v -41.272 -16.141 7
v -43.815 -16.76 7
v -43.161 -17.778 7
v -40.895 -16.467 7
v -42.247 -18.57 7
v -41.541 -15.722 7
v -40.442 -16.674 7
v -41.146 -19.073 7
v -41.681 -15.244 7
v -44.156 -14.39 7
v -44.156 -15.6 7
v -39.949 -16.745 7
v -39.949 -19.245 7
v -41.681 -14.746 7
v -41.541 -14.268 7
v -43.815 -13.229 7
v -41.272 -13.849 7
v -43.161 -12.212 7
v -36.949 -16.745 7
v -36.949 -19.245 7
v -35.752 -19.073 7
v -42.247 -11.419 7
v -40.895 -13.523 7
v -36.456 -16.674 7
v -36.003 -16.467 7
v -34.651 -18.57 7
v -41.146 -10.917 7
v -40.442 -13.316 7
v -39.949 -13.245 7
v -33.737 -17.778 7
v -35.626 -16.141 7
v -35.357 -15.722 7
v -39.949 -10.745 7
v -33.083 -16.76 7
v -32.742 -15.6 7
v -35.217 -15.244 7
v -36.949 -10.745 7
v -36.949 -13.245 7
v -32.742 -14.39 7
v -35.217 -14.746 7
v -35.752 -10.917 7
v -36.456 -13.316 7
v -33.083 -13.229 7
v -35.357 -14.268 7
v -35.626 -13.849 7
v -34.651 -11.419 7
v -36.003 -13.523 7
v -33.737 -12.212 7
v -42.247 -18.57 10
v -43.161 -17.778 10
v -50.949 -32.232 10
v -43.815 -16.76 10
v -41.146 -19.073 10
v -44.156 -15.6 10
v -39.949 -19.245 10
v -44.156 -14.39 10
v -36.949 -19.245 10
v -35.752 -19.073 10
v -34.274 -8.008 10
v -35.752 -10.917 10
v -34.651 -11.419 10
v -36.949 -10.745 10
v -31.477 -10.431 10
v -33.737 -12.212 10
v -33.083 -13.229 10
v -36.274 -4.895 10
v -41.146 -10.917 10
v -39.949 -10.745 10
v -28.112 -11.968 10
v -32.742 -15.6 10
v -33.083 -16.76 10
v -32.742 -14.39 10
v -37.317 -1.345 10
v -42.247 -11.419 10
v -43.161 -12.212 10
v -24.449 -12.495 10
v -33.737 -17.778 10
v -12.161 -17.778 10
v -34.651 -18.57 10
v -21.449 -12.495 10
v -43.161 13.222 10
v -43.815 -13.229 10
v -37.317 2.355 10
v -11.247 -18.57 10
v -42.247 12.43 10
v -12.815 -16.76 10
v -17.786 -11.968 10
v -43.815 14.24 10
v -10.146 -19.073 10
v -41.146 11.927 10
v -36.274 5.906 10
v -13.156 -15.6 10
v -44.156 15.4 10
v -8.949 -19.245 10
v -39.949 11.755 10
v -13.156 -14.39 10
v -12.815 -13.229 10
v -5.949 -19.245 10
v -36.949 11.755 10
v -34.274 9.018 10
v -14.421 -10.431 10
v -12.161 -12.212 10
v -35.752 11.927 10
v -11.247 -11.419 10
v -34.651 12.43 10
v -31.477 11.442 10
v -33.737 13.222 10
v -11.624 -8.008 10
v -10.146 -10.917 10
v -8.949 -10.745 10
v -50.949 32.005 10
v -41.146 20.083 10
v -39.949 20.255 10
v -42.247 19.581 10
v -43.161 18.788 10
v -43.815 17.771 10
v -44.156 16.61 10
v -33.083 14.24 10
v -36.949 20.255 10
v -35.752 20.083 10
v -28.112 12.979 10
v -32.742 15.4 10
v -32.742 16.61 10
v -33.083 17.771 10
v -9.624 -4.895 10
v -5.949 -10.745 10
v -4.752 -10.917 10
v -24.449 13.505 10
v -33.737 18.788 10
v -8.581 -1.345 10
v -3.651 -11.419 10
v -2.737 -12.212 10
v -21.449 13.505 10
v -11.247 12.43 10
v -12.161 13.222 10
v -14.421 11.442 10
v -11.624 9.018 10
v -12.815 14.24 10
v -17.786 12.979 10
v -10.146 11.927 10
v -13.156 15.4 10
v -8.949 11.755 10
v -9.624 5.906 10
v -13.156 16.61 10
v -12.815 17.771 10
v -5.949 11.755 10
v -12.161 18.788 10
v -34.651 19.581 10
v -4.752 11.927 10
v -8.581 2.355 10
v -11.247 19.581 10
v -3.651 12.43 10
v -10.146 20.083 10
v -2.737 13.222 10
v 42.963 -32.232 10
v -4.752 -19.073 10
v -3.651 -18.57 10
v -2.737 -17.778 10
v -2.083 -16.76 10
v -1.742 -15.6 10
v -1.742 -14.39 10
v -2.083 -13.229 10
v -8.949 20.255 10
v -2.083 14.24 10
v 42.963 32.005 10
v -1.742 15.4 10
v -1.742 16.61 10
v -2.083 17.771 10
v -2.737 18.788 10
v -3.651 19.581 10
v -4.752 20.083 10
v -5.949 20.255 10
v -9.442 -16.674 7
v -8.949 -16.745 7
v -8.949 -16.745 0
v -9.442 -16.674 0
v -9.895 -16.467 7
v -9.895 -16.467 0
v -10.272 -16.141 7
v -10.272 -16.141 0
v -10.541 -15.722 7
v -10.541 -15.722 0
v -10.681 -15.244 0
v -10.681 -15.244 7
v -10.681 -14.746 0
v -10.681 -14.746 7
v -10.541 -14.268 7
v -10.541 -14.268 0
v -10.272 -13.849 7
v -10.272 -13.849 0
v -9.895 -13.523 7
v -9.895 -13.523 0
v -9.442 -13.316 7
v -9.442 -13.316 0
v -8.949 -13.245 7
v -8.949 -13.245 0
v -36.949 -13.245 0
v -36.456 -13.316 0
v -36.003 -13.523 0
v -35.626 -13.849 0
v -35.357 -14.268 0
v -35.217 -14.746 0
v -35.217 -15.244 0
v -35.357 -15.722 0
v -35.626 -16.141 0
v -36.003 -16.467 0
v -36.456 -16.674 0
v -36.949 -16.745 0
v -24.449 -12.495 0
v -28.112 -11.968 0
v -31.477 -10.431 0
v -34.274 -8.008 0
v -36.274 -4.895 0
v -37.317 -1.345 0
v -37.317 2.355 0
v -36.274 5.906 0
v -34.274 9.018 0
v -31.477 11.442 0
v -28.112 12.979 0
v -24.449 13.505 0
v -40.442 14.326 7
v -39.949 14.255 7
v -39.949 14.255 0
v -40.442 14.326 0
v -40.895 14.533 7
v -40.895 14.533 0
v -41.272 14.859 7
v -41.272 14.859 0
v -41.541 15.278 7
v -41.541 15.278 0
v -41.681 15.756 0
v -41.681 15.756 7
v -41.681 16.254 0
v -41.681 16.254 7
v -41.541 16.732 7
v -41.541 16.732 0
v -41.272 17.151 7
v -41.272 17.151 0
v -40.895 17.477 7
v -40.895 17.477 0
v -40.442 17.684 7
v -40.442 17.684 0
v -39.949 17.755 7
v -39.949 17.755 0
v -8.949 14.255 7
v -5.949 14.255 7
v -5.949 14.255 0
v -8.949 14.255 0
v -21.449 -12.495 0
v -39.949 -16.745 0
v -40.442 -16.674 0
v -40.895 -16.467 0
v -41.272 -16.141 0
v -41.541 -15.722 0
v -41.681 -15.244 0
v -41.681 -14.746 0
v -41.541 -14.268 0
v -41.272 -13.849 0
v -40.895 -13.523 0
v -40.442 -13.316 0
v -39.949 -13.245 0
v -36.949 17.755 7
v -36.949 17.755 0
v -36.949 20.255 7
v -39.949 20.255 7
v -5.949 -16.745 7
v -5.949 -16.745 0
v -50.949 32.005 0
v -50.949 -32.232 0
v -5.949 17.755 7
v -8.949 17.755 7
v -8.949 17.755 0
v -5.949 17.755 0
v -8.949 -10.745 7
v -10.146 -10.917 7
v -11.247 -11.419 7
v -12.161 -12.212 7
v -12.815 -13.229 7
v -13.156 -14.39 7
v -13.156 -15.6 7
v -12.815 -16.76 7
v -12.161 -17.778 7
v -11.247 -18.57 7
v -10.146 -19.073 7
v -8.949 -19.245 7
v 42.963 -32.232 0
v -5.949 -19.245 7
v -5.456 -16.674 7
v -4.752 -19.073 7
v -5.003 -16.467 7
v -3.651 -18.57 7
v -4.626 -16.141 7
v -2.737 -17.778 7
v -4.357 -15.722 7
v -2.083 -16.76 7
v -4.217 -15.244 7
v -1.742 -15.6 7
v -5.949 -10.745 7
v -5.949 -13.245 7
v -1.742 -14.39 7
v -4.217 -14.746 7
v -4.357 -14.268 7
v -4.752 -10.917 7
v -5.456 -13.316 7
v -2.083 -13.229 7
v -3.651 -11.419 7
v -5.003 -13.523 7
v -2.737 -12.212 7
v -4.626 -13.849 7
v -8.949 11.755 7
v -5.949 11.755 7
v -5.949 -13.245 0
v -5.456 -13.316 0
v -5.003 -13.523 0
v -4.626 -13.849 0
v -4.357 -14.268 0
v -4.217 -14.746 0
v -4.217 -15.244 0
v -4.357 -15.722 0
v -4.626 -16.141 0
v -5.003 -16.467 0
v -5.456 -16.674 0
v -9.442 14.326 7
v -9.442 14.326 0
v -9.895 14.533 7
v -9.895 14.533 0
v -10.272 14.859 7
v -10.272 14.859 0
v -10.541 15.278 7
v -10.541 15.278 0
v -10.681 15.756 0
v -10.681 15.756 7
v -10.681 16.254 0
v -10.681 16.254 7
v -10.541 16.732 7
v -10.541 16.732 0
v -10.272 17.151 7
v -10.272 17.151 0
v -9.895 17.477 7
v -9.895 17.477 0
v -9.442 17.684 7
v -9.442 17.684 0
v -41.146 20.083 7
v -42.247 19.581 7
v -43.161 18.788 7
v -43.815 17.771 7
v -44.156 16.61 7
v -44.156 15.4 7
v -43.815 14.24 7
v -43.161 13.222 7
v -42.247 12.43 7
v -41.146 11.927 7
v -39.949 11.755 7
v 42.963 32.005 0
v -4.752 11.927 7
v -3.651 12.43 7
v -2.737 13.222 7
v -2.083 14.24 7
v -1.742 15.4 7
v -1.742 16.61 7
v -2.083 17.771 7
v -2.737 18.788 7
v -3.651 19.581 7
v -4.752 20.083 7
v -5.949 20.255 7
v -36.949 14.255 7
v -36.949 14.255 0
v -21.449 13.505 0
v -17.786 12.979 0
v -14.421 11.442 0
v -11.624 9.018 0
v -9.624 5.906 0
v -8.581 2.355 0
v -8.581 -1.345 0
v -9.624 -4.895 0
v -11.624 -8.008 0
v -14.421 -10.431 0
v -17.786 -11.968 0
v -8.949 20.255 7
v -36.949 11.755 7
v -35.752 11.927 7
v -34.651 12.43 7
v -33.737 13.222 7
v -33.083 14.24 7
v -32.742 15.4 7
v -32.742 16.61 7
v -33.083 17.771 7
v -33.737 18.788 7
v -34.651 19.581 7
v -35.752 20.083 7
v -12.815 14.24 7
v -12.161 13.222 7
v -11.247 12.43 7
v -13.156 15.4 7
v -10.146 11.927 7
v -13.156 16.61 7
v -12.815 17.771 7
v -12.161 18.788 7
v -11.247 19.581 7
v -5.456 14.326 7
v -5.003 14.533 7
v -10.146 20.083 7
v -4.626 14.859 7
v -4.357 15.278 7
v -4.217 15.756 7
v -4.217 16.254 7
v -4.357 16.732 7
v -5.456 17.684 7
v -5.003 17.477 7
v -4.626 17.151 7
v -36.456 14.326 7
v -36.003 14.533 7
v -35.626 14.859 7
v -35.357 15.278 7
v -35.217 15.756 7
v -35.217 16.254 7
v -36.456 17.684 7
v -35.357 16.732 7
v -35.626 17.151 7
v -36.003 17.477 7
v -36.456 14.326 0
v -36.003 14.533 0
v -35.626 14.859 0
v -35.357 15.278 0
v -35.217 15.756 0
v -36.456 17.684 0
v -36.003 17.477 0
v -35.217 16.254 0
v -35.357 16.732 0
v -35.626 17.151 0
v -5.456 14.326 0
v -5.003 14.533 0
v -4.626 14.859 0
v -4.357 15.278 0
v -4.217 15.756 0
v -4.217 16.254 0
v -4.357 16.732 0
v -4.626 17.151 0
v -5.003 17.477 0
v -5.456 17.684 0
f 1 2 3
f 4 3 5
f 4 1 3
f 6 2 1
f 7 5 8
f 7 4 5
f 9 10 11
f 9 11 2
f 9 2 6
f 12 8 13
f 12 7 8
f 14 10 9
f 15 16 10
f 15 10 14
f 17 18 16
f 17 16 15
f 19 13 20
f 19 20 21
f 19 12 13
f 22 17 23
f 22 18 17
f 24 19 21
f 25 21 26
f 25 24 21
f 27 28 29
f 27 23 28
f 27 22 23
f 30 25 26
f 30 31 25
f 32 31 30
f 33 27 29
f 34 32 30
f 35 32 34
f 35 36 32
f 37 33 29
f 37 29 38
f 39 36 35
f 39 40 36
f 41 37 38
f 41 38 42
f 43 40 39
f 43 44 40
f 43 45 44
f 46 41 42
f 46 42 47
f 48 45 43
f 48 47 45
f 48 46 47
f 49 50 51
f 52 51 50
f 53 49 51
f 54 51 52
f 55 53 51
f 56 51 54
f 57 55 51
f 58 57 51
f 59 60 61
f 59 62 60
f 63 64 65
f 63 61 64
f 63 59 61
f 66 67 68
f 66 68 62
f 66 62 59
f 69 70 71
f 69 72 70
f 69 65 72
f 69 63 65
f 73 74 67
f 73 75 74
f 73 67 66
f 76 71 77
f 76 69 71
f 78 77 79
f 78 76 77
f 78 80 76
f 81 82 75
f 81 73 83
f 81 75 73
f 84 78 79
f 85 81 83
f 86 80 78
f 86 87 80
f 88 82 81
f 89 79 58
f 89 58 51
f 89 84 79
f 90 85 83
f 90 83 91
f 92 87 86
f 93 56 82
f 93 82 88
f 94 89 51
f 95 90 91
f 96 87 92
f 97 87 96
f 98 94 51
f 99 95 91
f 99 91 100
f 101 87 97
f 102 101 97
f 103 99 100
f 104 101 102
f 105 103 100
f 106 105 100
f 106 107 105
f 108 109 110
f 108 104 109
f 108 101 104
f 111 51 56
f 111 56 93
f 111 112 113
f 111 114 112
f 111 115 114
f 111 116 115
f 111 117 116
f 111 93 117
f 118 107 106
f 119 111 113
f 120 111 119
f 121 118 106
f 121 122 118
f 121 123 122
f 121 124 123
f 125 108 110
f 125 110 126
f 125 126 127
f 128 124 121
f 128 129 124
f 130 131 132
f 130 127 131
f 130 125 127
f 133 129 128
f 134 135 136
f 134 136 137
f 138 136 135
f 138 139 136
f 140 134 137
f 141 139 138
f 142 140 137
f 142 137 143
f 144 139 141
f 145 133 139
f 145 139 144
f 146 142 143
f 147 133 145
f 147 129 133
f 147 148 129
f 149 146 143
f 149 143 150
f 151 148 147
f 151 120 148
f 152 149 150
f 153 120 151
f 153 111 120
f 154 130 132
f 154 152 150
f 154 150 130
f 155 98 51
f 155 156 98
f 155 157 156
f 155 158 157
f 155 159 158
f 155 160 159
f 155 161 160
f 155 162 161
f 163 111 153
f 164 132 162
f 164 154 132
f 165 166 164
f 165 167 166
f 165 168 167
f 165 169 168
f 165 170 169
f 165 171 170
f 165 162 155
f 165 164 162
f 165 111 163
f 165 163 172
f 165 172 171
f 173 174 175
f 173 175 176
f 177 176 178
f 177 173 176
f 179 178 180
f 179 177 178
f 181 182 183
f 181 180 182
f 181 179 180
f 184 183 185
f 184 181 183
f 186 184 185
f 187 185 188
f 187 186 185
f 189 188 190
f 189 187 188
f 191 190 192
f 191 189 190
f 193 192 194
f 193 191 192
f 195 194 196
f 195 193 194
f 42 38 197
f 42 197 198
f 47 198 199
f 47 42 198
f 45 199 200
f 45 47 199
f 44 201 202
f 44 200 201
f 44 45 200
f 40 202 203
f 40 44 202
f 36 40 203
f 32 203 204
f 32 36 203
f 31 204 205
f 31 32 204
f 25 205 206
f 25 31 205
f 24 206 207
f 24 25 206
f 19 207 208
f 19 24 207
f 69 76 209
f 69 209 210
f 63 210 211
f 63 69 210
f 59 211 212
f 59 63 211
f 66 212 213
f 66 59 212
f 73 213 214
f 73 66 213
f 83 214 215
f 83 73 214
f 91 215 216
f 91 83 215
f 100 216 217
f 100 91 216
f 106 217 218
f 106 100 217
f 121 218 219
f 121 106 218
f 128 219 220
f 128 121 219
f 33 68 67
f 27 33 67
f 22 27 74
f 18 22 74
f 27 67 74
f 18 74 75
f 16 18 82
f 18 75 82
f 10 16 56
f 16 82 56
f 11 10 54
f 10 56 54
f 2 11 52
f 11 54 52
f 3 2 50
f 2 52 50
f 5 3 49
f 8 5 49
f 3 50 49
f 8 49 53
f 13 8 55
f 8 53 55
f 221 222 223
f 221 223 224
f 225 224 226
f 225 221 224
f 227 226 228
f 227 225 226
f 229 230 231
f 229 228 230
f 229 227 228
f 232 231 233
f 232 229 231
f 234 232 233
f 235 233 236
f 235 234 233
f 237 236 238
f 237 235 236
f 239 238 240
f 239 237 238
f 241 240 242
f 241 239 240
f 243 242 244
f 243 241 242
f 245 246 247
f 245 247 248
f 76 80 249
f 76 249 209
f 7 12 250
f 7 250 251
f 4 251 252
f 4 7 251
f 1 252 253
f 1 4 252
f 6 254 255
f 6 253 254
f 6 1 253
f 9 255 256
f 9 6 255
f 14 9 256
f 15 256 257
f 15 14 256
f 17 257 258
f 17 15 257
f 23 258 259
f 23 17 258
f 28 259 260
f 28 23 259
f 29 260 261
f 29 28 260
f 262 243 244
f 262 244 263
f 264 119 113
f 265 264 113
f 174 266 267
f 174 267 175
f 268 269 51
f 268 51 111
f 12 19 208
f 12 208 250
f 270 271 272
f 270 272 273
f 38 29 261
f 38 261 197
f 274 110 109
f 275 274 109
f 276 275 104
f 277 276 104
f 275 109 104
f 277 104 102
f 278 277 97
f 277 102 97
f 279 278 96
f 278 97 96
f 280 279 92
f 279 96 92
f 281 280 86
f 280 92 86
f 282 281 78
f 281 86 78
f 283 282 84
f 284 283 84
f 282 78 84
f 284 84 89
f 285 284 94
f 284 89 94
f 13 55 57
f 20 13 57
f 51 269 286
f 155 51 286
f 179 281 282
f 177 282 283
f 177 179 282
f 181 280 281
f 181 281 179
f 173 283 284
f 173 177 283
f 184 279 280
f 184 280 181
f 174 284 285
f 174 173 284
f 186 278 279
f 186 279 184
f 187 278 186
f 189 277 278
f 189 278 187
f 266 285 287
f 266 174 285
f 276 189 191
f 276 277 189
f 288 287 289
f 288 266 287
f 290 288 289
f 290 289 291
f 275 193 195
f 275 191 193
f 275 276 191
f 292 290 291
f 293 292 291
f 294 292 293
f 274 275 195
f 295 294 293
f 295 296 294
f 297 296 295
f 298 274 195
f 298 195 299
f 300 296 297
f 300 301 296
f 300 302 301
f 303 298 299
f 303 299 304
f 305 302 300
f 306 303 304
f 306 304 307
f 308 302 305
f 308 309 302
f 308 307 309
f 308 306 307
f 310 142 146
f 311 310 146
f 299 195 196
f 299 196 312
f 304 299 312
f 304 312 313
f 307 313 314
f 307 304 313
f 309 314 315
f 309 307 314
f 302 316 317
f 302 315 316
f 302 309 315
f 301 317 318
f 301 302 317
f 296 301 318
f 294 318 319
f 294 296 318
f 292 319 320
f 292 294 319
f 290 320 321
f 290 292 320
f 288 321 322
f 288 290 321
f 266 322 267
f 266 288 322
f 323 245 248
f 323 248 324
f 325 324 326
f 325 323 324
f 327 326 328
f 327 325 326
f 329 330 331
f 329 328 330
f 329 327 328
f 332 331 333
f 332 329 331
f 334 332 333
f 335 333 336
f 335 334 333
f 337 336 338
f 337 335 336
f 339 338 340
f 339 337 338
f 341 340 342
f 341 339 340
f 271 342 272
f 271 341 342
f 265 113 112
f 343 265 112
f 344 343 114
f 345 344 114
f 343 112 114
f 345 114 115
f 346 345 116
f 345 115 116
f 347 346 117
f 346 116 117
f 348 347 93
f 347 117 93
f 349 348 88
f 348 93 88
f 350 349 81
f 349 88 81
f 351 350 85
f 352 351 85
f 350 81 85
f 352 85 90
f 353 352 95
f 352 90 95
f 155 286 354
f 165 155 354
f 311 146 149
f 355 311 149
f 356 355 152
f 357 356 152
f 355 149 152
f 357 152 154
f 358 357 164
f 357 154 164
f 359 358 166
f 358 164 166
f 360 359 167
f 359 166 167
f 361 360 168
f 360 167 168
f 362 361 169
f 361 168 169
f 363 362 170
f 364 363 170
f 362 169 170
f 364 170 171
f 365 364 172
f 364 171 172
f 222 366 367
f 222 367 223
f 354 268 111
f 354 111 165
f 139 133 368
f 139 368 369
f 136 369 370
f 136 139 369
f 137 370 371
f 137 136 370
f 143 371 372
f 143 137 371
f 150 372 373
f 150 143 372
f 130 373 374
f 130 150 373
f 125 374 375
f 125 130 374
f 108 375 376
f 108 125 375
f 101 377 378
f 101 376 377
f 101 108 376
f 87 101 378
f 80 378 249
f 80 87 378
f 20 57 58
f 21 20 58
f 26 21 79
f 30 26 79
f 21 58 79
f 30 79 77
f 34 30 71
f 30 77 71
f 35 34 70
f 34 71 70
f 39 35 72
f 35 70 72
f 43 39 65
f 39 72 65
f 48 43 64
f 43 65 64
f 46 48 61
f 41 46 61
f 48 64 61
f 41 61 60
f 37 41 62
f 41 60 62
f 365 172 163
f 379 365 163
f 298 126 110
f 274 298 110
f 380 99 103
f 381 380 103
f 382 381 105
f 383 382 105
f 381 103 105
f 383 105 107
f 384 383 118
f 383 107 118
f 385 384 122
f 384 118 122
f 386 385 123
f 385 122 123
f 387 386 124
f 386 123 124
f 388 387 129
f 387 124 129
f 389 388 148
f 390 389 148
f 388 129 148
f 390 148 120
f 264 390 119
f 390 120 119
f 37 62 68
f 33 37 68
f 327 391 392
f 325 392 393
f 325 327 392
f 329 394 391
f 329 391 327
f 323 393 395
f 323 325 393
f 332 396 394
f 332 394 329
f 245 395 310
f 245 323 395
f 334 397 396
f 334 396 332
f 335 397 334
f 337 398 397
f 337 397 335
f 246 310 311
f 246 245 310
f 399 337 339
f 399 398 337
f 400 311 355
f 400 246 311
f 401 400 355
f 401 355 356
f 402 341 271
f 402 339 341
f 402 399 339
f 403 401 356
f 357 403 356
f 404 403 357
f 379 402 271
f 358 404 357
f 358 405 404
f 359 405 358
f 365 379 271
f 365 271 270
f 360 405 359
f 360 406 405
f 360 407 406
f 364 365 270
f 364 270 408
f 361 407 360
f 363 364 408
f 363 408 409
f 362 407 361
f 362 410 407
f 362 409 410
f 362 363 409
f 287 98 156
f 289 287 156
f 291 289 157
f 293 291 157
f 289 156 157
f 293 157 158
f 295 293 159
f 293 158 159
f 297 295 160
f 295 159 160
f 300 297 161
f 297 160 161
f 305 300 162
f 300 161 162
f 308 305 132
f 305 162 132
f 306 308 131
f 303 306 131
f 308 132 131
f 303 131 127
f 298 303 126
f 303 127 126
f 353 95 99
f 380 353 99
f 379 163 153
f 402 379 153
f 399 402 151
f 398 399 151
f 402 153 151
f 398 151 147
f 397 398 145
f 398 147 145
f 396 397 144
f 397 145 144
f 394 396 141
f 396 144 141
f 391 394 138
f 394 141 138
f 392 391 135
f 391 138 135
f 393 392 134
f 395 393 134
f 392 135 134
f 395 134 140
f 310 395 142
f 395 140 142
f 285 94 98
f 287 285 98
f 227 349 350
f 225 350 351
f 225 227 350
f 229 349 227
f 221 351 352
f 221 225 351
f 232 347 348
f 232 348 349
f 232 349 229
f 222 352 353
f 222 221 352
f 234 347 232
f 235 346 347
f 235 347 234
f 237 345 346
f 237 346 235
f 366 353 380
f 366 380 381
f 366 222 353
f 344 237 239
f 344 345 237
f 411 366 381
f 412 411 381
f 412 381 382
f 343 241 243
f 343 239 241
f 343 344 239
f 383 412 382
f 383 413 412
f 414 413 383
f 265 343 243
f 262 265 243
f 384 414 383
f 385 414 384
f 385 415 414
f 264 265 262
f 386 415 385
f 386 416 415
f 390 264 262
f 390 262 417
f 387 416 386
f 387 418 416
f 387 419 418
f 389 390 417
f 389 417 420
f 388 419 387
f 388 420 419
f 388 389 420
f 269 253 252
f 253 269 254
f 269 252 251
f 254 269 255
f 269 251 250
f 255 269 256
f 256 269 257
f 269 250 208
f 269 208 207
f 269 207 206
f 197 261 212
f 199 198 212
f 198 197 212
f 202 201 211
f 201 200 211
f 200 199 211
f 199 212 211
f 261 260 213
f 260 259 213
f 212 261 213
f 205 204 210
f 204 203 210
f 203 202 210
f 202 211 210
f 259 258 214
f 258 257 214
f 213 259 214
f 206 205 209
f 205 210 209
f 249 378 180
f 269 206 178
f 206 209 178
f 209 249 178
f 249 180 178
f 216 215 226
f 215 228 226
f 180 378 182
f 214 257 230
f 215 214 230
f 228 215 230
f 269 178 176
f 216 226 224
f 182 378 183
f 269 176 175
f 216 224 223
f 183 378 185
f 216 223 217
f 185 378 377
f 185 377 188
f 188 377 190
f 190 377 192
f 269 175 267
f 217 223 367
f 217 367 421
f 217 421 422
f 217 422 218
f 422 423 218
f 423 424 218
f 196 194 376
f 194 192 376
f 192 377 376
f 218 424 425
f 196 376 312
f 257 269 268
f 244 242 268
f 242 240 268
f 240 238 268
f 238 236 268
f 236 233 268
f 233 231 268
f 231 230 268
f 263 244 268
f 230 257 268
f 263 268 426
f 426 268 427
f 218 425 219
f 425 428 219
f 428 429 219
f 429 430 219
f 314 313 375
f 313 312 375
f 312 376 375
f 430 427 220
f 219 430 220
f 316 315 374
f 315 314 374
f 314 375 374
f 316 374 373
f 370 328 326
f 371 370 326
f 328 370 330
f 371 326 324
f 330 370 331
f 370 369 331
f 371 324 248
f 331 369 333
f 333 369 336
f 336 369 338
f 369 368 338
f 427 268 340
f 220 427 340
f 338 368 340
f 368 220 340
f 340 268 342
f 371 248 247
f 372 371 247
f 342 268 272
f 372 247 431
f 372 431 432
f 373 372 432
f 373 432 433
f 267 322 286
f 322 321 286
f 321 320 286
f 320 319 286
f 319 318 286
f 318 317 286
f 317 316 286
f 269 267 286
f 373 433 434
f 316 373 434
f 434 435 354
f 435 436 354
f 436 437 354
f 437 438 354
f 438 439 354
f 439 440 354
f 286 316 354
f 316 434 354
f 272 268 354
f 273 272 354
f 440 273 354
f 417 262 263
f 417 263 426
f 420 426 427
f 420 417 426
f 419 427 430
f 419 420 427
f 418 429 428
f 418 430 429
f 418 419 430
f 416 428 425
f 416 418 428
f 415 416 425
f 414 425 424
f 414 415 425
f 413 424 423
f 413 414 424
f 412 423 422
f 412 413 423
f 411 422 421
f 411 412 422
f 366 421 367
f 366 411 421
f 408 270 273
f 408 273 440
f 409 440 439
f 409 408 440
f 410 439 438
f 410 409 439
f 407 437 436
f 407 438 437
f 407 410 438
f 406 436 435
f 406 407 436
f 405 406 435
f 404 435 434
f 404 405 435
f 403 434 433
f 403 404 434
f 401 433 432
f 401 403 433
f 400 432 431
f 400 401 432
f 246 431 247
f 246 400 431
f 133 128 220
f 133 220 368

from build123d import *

# Parameters (mm, degrees)
SKETCH1_W           = 93.911938319
SKETCH1_H           = 64.237222829
BOSS_EXTRUDE1_DEPTH = 10
CUT_EXTRUDE1_DEPTH  = 20
CUT_EXTRUDE2_DEPTH  = 3


with BuildPart() as part:
    # Sketch1 → Boss-Extrude1 (new body)
    with BuildSketch(Plane.XY):
        with Locations((-3.99305407, -0.113373268)):
            Rectangle(SKETCH1_W, SKETCH1_H)
    extrude(amount=BOSS_EXTRUDE1_DEPTH)

    # Sketch2 → Cut-Extrude1 (cut)
    with BuildSketch(Plane.XY.offset(10)):
        with BuildLine():
            Line((-39.949023229, 17.755238146), (-36.949023229, 17.755238146))
            ThreePointArc((-36.949023229, 17.755238146), (-35.199023229, 16.005238146), (-36.949023229, 14.255238146))
            Line((-36.949023229, 14.255238146), (-39.949023229, 14.255238146))
            ThreePointArc((-39.949023229, 14.255238146), (-41.699023229, 16.005238146), (-39.949023229, 17.755238146))
        make_face()
        with BuildLine():
            Line((-8.949023229, 17.755238146), (-5.949023229, 17.755238146))
            ThreePointArc((-5.949023229, 17.755238146), (-4.199023229, 16.005238146), (-5.949023229, 14.255238146))
            Line((-5.949023229, 14.255238146), (-8.949023229, 14.255238146))
            ThreePointArc((-8.949023229, 14.255238146), (-10.699023229, 16.005238146), (-8.949023229, 17.755238146))
        make_face()
        with BuildLine():
            Line((-8.949023229, -13.244761854), (-5.949023229, -13.244761854))
            ThreePointArc((-5.949023229, -13.244761854), (-4.199023229, -14.994761854), (-5.949023229, -16.744761854))
            Line((-5.949023229, -16.744761854), (-8.949023229, -16.744761854))
            ThreePointArc((-8.949023229, -16.744761854), (-10.699023229, -14.994761854), (-8.949023229, -13.244761854))
        make_face()
        with BuildLine():
            Line((-39.949023229, -13.244761854), (-36.949023229, -13.244761854))
            ThreePointArc((-36.949023229, -13.244761854), (-35.199023229, -14.994761854), (-36.949023229, -16.744761854))
            Line((-36.949023229, -16.744761854), (-39.949023229, -16.744761854))
            ThreePointArc((-39.949023229, -16.744761854), (-41.699023229, -14.994761854), (-39.949023229, -13.244761854))
        make_face()
        with BuildLine():
            Line((-24.449023229, 13.505238146), (-21.449023229, 13.505238146))
            ThreePointArc((-21.449023229, 13.505238146), (-8.449023229, 0.505238146), (-21.449023229, -12.494761854))
            Line((-21.449023229, -12.494761854), (-24.449023229, -12.494761854))
            ThreePointArc((-24.449023229, -12.494761854), (-37.449023229, 0.505238146), (-24.449023229, 13.505238146))
        make_face()
    extrude(amount=-CUT_EXTRUDE1_DEPTH, mode=Mode.SUBTRACT)

    # Sketch3 → Cut-Extrude2 (cut)
    with BuildSketch(Plane.XY.offset(10)):
        with BuildLine():
            Line((-36.949023229, 20.255238146), (-39.949023229, 20.255238146))
            ThreePointArc((-39.949023229, 20.255238146), (-44.199023229, 16.005238146), (-39.949023229, 11.755238146))
            Line((-39.949023229, 11.755238146), (-36.949023229, 11.755238146))
            ThreePointArc((-36.949023229, 11.755238146), (-32.699023229, 16.005238146), (-36.949023229, 20.255238146))
        make_face()
        with BuildLine():
            Line((-5.949023229, 20.255238146), (-8.949023229, 20.255238146))
            ThreePointArc((-8.949023229, 20.255238146), (-13.199023229, 16.005238146), (-8.949023229, 11.755238146))
            Line((-8.949023229, 11.755238146), (-5.949023229, 11.755238146))
            ThreePointArc((-5.949023229, 11.755238146), (-1.699023229, 16.005238146), (-5.949023229, 20.255238146))
        make_face()
        with BuildLine():
            Line((-5.949023229, -10.744761854), (-8.949023229, -10.744761854))
            ThreePointArc((-8.949023229, -10.744761854), (-13.199023229, -14.994761854), (-8.949023229, -19.244761854))
            Line((-8.949023229, -19.244761854), (-5.949023229, -19.244761854))
            ThreePointArc((-5.949023229, -19.244761854), (-1.699023229, -14.994761854), (-5.949023229, -10.744761854))
        make_face()
        with BuildLine():
            Line((-39.949023229, -19.244761854), (-36.949023229, -19.244761854))
            ThreePointArc((-36.949023229, -19.244761854), (-32.699023229, -14.994761854), (-36.949023229, -10.744761854))
            Line((-36.949023229, -10.744761854), (-39.949023229, -10.744761854))
            ThreePointArc((-39.949023229, -10.744761854), (-44.199023229, -14.994761854), (-39.949023229, -19.244761854))
        make_face()
    extrude(amount=-CUT_EXTRUDE2_DEPTH, mode=Mode.SUBTRACT)


solid = part.part
